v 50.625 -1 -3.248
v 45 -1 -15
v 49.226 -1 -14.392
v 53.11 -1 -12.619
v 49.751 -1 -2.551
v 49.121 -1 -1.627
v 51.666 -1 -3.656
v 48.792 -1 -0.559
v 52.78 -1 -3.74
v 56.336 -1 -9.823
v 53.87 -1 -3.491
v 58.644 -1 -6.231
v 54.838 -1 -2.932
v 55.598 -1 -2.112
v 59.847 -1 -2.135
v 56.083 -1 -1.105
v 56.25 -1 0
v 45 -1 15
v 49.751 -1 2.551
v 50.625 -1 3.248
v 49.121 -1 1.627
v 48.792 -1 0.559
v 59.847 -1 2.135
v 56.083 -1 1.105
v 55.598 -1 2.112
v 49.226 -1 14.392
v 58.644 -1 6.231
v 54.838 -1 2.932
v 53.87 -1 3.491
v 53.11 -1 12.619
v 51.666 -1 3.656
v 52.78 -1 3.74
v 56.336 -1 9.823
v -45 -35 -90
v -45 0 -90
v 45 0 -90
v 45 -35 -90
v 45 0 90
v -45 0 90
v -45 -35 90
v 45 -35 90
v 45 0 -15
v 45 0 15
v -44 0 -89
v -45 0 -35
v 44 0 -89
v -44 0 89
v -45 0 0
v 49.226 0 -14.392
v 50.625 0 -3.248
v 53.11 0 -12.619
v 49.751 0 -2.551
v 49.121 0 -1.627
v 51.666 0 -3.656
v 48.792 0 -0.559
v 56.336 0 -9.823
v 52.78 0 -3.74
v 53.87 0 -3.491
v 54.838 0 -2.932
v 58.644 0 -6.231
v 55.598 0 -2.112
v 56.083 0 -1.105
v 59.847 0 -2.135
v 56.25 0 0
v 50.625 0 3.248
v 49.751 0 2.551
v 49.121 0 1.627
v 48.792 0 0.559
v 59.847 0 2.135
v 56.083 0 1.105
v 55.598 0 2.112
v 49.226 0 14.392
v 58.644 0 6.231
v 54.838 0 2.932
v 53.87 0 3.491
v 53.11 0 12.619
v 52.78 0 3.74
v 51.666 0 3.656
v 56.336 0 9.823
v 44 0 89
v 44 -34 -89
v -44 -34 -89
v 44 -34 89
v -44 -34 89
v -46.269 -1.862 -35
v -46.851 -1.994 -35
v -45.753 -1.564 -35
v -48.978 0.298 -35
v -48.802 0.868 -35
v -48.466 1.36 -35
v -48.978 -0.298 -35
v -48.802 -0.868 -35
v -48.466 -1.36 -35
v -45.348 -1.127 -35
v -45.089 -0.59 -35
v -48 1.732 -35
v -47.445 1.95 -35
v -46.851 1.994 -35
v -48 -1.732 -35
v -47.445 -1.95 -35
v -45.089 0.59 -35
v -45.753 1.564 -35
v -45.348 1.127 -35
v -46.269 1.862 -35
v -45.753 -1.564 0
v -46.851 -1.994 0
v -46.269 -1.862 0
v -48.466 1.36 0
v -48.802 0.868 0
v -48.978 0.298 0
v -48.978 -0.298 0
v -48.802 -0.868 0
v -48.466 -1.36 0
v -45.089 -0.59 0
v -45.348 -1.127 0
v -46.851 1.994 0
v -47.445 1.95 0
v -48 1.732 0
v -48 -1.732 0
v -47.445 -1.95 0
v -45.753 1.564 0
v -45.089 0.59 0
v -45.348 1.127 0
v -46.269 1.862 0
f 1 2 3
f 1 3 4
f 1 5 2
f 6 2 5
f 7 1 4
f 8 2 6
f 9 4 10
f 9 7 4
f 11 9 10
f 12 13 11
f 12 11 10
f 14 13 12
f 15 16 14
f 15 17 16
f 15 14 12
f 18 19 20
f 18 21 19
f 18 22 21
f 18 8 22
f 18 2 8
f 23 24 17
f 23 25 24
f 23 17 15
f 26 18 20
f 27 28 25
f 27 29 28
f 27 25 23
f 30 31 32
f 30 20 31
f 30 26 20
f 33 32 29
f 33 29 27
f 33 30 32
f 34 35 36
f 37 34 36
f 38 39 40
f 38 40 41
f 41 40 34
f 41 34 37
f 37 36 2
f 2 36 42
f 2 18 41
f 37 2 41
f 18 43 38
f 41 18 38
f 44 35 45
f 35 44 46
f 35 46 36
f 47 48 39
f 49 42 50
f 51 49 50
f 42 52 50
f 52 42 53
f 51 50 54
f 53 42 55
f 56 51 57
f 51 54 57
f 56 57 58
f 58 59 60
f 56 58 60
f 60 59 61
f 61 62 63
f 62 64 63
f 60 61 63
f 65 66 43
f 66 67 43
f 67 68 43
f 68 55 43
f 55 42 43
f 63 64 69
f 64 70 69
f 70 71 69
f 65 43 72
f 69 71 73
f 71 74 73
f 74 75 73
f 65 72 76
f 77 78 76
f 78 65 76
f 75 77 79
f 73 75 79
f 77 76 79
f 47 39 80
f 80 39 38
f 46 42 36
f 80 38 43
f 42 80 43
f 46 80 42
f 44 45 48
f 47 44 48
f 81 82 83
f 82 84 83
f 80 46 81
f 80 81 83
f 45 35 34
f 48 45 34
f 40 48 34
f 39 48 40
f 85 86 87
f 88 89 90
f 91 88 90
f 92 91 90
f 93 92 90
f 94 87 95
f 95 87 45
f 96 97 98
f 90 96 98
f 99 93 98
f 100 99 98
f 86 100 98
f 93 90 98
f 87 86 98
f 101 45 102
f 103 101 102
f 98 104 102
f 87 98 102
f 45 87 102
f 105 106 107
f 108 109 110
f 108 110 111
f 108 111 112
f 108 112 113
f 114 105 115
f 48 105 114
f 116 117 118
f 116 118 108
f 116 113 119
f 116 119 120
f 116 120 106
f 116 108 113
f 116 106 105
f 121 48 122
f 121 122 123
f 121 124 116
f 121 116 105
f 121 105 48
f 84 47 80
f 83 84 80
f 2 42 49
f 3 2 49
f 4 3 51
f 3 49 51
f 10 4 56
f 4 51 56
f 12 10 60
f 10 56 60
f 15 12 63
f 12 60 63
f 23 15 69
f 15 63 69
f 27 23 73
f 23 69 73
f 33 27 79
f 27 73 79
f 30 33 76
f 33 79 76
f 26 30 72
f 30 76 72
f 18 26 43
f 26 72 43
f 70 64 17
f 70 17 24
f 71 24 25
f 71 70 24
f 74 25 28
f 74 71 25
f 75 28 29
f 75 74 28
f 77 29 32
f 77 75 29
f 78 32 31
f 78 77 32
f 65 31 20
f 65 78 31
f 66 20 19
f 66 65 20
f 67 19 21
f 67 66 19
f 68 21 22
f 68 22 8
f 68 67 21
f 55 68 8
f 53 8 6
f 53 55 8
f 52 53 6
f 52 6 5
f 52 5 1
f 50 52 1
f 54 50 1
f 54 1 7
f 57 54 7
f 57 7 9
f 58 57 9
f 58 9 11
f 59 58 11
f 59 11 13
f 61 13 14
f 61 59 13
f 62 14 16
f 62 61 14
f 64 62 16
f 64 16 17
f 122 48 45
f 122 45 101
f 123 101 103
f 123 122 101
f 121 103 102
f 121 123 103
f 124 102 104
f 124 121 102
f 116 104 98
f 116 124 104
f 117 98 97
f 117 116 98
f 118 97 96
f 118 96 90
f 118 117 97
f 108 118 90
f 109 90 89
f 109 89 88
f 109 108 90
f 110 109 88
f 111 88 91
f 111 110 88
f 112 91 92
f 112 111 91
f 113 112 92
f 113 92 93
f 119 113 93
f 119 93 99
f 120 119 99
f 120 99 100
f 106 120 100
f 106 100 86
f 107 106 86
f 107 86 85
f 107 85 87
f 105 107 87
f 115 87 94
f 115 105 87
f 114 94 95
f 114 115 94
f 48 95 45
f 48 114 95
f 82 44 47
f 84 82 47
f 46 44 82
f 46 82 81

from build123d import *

# Parameters (mm, degrees)
F0_W     = 90
F0_H     = 180
F1_DEPTH = 35
F2_T     = -1
F3_R     = 3.75
F4_DEPTH = 1
F5_R     = 2
F6_DEPTH = 35


with BuildPart() as f1:
    # F0 (on Front) → F1 (new body)
    with BuildSketch(Plane.XZ):
        Rectangle(F0_W, F0_H)
    extrude(amount=F1_DEPTH)

    # F2
    f2_openings = [f1.faces().sort_by_distance(p)[0] for p in [
        (0, 0, 0),
    ]]
    offset(amount=F2_T, openings=f2_openings)

    # F3 (on Front) → F4 (join)
    with BuildSketch(Plane.XZ):
        with BuildLine():
            ThreePointArc((45, -15), (60, 0), (45, 15))
            Line((45, 15), (45, -15))
        make_face()
        with Locations((52.5, 0)):
            Circle(F3_R, mode=Mode.SUBTRACT)
    extrude(amount=F4_DEPTH)

    # F5 (on Top) → F6 (join)
    with BuildSketch(Plane.XY):
        with Locations((-47, 0)):
            Circle(F5_R)
    extrude(amount=-F6_DEPTH)


solid = f1.part
